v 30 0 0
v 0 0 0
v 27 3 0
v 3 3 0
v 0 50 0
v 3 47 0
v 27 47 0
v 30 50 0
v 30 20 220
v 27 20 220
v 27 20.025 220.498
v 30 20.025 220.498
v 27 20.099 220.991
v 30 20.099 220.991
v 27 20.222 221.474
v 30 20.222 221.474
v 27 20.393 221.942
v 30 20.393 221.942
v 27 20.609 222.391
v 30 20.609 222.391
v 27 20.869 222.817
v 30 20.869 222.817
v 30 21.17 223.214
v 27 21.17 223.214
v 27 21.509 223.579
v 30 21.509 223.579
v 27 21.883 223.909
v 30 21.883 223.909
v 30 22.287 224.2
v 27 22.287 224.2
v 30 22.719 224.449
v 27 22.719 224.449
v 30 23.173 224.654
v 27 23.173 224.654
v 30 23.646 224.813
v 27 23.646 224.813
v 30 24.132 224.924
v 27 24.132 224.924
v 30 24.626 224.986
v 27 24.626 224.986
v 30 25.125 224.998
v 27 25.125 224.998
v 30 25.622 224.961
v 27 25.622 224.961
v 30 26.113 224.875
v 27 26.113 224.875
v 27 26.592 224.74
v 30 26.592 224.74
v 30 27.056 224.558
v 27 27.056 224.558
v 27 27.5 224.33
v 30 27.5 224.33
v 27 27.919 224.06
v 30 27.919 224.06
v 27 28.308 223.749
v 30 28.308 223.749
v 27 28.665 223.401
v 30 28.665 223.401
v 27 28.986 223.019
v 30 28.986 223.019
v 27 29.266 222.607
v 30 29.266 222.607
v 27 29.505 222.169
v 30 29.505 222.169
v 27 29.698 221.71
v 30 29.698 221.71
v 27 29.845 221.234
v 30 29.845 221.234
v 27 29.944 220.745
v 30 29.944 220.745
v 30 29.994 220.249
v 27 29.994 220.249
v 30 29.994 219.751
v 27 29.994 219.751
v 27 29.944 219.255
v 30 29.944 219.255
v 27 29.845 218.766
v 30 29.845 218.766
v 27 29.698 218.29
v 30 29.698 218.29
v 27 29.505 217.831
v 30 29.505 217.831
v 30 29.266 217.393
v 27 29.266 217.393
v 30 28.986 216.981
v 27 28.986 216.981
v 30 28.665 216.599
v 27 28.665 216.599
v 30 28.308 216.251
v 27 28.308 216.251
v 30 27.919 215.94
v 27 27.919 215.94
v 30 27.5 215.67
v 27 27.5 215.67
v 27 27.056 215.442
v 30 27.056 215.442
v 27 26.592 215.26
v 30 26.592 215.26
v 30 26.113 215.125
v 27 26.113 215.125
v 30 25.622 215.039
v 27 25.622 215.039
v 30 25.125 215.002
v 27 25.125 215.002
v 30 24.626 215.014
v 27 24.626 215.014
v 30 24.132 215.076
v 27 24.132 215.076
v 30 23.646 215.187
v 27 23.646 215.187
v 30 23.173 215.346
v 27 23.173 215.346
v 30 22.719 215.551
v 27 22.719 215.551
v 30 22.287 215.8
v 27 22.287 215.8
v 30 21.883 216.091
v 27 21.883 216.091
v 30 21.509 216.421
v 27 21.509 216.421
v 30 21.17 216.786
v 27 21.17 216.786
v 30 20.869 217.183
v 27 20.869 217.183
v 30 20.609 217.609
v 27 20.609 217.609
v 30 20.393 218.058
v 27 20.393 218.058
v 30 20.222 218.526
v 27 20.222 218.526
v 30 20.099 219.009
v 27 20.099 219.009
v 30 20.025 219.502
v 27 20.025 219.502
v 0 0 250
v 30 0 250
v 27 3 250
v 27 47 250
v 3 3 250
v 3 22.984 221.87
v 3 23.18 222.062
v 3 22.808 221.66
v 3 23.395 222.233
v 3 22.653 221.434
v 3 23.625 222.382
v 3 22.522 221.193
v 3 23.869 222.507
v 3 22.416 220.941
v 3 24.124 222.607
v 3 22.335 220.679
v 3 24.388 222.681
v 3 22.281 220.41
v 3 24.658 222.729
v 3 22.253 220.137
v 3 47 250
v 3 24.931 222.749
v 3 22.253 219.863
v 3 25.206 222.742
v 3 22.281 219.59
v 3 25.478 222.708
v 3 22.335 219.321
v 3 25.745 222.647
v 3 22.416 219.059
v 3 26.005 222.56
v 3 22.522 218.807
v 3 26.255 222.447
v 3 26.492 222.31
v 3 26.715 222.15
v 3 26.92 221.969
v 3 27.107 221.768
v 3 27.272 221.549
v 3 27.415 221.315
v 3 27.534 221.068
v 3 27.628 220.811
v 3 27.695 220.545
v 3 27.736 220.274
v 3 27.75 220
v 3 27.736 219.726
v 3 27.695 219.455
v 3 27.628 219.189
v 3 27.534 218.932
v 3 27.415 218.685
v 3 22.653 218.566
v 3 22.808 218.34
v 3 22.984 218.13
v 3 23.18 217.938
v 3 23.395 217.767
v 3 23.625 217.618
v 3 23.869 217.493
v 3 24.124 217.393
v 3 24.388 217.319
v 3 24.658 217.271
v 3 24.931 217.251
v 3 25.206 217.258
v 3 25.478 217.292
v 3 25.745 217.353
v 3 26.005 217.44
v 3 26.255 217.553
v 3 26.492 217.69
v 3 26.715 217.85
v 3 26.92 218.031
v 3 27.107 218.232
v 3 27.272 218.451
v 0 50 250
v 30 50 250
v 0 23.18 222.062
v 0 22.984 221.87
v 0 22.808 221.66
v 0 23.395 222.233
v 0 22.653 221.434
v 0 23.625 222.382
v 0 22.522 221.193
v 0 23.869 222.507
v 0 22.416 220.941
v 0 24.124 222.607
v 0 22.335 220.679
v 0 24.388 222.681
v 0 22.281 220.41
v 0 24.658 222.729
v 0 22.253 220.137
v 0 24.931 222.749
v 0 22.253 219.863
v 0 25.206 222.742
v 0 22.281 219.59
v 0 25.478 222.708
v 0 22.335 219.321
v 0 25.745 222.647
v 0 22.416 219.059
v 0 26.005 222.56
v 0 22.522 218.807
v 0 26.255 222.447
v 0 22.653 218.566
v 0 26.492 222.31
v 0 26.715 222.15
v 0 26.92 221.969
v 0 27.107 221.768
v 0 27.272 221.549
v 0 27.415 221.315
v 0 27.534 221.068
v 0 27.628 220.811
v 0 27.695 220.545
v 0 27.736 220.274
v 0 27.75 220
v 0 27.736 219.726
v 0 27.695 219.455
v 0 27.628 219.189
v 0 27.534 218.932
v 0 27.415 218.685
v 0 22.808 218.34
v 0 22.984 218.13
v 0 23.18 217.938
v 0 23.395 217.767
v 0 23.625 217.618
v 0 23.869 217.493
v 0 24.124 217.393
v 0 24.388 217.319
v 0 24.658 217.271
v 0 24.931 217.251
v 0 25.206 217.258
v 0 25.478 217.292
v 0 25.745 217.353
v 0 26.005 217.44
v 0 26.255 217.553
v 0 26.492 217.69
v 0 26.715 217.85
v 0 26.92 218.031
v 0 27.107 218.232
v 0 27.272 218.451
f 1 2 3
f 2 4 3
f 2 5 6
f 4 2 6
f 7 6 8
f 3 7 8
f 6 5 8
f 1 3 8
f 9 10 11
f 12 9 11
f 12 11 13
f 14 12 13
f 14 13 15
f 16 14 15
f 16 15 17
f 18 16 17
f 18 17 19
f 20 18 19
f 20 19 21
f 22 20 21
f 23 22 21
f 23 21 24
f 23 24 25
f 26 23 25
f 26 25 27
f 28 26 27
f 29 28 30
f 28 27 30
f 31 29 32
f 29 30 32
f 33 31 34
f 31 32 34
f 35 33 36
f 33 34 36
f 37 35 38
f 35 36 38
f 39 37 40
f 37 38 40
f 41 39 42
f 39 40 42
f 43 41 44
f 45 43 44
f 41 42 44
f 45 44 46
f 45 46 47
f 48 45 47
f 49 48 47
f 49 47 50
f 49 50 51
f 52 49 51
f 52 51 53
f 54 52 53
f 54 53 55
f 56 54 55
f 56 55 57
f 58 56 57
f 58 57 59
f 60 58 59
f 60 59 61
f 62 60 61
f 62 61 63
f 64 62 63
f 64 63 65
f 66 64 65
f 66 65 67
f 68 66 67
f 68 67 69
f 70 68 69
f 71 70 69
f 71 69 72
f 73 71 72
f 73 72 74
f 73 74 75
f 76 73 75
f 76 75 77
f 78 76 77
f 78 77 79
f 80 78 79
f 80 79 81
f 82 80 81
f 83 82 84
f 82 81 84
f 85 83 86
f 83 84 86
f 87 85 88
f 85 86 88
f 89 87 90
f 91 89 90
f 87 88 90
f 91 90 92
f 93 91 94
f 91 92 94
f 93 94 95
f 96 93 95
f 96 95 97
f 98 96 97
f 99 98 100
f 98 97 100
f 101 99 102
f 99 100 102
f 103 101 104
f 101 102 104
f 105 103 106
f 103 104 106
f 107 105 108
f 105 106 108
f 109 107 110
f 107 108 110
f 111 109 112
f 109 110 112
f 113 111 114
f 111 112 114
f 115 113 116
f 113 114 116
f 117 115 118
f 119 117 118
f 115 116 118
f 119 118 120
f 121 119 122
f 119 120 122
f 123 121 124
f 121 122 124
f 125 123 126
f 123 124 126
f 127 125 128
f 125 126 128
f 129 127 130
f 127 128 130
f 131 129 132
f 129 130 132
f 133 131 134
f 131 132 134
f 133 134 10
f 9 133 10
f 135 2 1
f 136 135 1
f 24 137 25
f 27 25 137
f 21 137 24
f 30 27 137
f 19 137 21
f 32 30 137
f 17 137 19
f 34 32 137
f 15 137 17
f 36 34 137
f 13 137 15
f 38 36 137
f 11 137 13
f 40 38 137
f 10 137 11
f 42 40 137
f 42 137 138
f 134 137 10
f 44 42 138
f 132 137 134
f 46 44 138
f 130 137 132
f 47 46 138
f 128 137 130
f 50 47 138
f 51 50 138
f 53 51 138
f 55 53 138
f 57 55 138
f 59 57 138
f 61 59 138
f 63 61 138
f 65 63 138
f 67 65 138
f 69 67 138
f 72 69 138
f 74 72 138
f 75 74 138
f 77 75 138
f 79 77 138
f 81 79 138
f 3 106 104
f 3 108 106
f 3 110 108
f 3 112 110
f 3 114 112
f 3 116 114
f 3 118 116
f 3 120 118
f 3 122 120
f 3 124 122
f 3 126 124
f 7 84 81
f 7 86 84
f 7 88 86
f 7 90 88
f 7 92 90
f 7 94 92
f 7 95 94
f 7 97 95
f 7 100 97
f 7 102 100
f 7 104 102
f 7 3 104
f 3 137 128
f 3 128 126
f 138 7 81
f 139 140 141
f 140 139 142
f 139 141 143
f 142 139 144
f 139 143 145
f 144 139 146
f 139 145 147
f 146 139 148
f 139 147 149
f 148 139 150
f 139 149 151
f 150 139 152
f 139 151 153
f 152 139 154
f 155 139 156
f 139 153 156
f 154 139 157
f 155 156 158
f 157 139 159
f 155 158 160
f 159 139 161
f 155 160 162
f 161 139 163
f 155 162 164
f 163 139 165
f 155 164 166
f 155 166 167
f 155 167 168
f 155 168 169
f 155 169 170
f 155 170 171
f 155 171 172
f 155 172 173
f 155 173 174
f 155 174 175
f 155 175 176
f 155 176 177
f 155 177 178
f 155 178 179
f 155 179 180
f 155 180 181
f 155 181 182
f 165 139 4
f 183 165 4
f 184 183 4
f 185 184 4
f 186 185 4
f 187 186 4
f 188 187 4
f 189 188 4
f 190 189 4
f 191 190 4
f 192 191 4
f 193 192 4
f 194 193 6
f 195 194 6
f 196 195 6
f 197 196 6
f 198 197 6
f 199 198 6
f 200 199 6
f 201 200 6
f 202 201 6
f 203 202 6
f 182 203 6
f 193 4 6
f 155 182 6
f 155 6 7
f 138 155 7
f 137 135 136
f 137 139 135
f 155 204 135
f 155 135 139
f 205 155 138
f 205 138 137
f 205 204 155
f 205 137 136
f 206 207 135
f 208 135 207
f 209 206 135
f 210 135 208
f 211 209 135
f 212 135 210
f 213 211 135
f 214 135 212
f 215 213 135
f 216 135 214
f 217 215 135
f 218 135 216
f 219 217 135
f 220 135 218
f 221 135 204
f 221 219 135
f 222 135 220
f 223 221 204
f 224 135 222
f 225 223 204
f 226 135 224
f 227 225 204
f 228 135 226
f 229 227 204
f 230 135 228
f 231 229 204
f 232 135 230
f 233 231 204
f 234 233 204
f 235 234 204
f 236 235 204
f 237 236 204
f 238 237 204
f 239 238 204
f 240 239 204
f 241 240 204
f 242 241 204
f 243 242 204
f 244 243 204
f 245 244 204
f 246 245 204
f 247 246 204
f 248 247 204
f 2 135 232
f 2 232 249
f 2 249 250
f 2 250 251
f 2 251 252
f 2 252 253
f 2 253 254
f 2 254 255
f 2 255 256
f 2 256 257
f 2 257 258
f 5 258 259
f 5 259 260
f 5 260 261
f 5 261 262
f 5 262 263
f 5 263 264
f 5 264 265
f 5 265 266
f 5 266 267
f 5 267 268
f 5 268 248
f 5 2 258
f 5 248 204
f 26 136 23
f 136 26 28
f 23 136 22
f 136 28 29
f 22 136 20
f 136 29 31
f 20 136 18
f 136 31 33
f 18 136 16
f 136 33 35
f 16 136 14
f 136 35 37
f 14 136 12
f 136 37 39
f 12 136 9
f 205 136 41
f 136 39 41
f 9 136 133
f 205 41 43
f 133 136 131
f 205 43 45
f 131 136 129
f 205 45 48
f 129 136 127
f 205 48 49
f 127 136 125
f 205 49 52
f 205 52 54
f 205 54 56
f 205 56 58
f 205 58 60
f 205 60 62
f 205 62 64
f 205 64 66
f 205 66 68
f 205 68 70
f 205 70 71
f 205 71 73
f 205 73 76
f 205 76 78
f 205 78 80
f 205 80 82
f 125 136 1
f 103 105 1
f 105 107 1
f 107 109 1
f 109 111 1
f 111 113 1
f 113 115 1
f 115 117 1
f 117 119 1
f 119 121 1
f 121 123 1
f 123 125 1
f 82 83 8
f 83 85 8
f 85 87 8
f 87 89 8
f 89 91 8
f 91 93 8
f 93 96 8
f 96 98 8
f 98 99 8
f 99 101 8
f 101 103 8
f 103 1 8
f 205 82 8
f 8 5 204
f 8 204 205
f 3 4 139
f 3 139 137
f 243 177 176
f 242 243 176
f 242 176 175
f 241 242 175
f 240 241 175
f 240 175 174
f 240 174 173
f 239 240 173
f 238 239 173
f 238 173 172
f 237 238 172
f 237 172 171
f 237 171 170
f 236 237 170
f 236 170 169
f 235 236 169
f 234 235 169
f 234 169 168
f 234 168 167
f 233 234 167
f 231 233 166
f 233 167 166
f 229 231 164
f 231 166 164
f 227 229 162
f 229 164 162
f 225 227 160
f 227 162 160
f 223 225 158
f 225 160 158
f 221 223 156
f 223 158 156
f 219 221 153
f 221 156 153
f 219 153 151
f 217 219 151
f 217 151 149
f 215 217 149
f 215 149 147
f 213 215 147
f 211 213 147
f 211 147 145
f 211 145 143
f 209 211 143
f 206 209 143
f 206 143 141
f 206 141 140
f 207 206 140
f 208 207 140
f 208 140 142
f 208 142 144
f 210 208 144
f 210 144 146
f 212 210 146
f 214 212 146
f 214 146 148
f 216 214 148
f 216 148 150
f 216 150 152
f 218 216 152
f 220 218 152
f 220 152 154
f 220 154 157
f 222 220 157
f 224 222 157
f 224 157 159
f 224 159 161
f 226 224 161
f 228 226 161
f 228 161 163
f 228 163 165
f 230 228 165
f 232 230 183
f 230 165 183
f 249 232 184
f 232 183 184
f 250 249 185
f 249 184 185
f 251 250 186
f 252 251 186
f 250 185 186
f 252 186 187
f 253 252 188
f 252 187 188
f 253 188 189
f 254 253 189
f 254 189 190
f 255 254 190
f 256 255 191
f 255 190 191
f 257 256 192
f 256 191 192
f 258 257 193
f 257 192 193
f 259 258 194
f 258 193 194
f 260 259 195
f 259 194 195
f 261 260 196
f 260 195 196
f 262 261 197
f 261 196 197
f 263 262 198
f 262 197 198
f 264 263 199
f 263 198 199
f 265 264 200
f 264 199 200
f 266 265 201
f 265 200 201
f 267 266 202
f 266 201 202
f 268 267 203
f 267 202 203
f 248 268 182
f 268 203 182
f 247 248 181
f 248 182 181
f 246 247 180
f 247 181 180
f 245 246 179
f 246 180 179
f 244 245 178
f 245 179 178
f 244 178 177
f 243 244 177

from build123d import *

# Parameters (mm, degrees)
F0_W     = 30
F0_H     = 50
F0_W_2   = 24
F0_H_2   = 44
F1_DEPTH = 250
F3_D     = 5.5
F5_D     = 10
F5_DEPTH = 5


with BuildPart() as f1:
    # F0 (on Top) → F1 (new body)
    with BuildSketch(Plane.XY):
        with Locations((15, 25)):
            Rectangle(F0_W, F0_H)
        with Locations((15, 25)):
            Rectangle(F0_W_2, F0_H_2, mode=Mode.SUBTRACT)
    extrude(amount=F1_DEPTH)

    # F3 (through all)
    with Locations(Plane(origin=(0, 0, 0), x_dir=(0, -1, 0), z_dir=(-1, 0, 0))):
        with Locations((-25, 220)):
            Hole(F3_D / 2)

    # F5
    with Locations(Plane.YZ.offset(30)):
        with Locations((25, 220)):
            Hole(F5_D / 2, depth=F5_DEPTH)


solid = f1.part
